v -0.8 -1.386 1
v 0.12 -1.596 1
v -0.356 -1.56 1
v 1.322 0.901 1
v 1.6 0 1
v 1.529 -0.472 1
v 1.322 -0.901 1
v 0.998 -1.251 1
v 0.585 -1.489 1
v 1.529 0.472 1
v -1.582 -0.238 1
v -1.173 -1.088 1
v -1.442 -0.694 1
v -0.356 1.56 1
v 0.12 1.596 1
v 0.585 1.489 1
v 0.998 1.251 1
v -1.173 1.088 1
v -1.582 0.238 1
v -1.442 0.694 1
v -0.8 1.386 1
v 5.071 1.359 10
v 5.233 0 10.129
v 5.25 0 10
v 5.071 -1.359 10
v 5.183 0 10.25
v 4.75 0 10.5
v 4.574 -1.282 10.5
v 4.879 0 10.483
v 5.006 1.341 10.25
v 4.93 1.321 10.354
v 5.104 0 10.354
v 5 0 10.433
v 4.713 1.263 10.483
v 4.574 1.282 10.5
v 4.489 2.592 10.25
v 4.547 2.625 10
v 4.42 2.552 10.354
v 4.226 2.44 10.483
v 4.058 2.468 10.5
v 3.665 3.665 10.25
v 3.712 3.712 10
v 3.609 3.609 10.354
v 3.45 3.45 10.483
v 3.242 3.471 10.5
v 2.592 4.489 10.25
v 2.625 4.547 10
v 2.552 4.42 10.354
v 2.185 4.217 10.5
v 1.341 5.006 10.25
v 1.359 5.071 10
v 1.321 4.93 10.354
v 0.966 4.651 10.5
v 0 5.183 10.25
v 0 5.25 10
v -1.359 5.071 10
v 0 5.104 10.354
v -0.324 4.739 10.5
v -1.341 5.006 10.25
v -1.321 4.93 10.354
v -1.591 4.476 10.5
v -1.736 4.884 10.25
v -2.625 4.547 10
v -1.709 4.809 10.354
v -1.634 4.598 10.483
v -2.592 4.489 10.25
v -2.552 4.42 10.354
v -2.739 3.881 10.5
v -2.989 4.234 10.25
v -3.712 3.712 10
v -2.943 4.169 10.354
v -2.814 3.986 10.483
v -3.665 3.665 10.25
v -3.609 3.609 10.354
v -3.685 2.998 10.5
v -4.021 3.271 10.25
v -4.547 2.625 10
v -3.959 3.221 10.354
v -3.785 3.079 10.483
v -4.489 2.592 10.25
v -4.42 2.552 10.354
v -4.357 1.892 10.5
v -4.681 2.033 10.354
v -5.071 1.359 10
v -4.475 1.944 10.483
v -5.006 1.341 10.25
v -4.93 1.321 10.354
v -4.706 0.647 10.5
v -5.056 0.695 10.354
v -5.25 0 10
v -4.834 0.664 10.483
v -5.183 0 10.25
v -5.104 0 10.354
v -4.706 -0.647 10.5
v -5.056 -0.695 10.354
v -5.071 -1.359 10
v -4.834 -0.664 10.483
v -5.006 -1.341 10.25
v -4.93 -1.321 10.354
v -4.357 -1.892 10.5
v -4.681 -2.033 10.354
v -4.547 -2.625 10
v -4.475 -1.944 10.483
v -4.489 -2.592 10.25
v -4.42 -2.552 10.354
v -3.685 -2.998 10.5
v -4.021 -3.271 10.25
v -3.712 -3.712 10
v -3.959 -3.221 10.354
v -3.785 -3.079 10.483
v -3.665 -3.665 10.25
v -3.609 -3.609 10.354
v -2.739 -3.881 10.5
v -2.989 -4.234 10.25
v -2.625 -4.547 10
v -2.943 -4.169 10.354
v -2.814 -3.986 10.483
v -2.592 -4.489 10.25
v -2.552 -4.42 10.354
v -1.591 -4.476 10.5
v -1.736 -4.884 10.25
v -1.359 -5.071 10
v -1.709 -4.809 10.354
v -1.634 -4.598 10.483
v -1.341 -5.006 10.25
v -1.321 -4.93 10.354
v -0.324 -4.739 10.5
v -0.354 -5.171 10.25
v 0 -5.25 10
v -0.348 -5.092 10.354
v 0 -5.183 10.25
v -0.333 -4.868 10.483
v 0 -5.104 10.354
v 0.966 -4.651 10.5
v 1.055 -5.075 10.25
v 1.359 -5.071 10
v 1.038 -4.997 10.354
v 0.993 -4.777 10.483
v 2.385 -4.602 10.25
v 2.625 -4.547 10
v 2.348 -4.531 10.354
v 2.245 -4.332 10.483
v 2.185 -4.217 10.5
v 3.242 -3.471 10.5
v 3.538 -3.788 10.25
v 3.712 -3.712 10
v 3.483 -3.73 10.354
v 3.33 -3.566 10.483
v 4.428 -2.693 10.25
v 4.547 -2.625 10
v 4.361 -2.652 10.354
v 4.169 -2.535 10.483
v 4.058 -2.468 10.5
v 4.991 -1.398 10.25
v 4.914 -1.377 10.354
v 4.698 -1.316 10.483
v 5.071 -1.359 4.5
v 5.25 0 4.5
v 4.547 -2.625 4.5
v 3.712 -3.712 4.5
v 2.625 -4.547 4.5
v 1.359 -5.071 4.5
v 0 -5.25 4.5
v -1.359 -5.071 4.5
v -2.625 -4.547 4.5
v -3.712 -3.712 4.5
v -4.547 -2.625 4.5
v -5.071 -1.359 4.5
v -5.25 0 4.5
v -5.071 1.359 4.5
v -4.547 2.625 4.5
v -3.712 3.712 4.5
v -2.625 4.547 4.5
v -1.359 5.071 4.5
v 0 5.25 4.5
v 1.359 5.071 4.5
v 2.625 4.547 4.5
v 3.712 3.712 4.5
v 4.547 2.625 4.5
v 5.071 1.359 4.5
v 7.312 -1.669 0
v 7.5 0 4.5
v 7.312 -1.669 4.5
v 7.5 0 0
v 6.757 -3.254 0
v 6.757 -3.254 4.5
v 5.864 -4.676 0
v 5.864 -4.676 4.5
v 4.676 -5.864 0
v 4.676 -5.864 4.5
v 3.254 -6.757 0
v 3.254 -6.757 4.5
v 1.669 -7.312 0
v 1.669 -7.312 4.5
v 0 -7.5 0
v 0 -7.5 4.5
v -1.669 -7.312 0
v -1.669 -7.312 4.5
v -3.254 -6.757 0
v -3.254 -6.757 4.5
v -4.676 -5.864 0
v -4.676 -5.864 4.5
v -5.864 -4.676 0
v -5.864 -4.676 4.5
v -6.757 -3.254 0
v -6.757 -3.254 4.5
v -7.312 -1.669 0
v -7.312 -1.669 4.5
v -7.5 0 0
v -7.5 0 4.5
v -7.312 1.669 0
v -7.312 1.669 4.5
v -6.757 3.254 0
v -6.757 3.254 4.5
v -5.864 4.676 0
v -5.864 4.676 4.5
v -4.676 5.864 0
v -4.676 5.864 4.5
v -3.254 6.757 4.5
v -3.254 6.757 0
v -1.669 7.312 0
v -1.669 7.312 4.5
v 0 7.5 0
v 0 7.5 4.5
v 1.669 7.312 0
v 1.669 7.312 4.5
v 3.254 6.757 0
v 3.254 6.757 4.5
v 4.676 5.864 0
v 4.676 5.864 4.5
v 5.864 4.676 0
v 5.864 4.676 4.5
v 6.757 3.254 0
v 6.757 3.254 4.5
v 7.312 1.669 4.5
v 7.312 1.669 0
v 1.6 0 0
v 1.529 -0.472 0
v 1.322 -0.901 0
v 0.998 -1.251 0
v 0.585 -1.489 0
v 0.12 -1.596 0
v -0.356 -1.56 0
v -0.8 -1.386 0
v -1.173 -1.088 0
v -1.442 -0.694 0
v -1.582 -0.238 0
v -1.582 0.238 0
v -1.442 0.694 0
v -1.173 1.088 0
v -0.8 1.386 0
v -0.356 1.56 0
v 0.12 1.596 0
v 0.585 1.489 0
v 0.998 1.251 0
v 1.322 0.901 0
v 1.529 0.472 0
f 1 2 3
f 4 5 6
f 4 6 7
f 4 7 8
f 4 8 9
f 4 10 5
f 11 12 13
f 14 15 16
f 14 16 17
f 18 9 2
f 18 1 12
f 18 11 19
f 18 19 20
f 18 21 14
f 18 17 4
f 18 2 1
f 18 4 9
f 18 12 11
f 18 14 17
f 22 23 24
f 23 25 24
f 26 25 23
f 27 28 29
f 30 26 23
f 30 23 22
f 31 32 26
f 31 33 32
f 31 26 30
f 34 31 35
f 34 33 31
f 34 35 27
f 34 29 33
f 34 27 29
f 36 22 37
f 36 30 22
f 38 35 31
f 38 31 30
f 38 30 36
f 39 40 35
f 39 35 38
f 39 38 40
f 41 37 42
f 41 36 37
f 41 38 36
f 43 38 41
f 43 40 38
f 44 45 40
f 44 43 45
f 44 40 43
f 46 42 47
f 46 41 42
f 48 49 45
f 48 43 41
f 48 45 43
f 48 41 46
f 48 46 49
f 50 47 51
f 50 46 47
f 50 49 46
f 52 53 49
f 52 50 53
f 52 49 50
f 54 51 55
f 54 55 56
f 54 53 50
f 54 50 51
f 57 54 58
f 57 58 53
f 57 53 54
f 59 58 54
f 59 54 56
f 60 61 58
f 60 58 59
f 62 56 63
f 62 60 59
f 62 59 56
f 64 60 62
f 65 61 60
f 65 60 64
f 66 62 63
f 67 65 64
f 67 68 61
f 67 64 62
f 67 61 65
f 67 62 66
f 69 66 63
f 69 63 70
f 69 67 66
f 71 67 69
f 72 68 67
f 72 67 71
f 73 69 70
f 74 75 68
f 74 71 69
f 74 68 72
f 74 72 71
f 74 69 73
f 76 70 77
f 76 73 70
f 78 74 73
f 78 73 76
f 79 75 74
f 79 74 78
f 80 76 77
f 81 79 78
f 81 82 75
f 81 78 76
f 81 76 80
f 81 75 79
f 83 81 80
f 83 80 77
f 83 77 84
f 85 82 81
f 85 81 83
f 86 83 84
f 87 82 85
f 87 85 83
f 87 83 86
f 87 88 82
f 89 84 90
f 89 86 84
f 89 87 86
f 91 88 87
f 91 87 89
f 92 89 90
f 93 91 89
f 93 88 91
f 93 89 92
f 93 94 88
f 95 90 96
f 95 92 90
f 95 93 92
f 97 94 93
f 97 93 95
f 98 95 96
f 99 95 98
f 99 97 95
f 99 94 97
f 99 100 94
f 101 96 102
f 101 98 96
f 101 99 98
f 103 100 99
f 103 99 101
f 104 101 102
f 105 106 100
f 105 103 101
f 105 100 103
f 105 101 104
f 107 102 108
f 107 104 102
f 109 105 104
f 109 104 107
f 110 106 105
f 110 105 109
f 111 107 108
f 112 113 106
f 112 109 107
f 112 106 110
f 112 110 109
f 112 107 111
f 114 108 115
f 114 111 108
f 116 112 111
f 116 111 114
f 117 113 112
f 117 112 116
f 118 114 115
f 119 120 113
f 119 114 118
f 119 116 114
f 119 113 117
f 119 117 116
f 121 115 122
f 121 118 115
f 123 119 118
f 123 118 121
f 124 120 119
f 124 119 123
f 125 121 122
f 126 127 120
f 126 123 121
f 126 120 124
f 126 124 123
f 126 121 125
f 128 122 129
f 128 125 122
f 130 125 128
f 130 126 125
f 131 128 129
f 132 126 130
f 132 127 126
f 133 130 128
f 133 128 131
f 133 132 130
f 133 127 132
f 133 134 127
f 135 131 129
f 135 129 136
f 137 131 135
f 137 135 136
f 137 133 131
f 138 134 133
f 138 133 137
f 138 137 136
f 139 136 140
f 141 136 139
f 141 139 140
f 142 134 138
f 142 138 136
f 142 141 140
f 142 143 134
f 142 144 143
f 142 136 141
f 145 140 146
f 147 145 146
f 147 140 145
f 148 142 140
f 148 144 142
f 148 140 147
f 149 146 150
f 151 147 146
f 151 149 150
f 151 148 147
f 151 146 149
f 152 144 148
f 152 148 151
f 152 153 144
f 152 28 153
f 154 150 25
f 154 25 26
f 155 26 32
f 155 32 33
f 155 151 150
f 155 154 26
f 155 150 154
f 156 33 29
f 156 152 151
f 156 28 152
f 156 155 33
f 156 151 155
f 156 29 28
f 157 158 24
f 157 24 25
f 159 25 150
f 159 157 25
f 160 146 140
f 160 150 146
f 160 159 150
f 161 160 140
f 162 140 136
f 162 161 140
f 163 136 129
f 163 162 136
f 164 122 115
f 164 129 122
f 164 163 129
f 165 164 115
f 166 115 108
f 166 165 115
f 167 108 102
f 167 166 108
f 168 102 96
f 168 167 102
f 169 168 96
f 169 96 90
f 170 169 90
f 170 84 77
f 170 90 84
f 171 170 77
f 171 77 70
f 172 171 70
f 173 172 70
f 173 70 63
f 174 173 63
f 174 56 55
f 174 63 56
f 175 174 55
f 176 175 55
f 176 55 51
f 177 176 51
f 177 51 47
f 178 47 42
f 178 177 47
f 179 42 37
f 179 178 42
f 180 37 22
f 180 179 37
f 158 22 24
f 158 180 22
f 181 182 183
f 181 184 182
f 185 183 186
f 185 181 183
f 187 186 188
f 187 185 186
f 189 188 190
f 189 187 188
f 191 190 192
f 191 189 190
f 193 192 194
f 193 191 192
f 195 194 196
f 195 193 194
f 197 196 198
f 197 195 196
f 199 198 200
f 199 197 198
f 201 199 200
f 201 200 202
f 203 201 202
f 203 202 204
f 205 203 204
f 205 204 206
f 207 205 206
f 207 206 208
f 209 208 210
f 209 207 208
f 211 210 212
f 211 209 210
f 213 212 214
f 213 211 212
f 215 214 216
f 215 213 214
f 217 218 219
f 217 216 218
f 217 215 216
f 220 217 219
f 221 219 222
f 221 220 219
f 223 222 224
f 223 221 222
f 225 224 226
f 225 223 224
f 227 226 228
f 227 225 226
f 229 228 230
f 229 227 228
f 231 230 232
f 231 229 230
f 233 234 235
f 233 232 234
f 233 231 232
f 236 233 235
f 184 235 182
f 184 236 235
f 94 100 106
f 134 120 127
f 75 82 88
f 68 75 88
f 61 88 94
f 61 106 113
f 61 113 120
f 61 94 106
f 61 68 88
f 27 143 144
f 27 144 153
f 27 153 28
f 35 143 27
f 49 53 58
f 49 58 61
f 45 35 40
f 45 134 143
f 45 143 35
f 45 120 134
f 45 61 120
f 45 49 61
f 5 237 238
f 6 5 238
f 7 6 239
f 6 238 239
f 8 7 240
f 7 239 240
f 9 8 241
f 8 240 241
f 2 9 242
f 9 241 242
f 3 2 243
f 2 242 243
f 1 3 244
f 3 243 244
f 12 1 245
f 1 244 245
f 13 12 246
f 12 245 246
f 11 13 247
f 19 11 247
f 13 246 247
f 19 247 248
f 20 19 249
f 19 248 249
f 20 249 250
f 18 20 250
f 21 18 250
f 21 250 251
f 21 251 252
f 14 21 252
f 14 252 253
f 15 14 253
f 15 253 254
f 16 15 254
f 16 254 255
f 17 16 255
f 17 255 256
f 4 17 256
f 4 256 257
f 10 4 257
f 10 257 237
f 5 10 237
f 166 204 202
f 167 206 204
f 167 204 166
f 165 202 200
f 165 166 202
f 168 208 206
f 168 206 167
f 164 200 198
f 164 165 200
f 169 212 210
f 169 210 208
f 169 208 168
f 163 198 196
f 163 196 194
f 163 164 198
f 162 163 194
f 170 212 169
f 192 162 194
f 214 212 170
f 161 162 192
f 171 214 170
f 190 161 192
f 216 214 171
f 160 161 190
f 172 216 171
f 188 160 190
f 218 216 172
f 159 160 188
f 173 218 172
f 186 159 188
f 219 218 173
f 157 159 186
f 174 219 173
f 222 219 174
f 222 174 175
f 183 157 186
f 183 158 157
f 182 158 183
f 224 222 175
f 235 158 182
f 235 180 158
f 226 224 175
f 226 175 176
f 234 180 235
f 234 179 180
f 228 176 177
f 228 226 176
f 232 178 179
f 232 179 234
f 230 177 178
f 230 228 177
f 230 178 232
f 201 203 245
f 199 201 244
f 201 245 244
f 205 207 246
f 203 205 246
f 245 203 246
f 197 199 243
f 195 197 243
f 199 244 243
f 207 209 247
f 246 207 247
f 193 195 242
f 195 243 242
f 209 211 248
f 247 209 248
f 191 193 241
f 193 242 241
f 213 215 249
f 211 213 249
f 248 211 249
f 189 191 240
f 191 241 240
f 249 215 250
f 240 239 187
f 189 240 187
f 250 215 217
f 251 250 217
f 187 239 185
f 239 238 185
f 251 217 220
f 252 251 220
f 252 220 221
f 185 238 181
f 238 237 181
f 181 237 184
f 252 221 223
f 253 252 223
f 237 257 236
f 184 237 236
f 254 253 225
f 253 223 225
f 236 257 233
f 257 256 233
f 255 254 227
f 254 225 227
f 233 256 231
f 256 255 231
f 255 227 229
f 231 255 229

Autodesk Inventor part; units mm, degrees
ref_plane "YZ Plane" through (0, 0, 0) normal (1, 0, 0) x (0, 1, 0)
ref_plane "XZ Plane" through (0, 0, 0) normal (0, 1, 0) x (-1, 0, 0)
ref_plane "XY Plane" through (0, 0, 0) normal (0, 0, 1) x (1, 0, 0)
sketch "Sketch1" plane through (0, 0, 0) normal (0, 0, 1) x (1, 0, 0)
  circle A0 centre (0, 0) radius 7.5
  circle A1 centre (0, 0) radius 1.6
  dimension "d0" = 15
  dimension "d1" = 3.2
extrude "Ydre diameter" add sketch "Sketch1" along normal blind 4.5
sketch "Sketch2" plane through (0, 0, 4.5) normal (0, 0, 1) x (1, 0, 0)
  circle A0 centre (0, 0) radius 5.25
  dimension "d4" = 10.5
extrude "Indre diameter" add sketch "Sketch2" along normal blind 6
fillet "Fillet1" radius 0.5 1 edges at (-5.25, 0, 10.5)
sketch "Sketch3" plane through (0, 0, 4.5) normal (0, 0, -1) x (-1, 0, 0)
  circle A0 centre (0, 0) radius 1.6 projected
extrude "Reducering af indre hul" add sketch "Sketch3" along normal blind 3.5
properties part number "NØD-knap"
